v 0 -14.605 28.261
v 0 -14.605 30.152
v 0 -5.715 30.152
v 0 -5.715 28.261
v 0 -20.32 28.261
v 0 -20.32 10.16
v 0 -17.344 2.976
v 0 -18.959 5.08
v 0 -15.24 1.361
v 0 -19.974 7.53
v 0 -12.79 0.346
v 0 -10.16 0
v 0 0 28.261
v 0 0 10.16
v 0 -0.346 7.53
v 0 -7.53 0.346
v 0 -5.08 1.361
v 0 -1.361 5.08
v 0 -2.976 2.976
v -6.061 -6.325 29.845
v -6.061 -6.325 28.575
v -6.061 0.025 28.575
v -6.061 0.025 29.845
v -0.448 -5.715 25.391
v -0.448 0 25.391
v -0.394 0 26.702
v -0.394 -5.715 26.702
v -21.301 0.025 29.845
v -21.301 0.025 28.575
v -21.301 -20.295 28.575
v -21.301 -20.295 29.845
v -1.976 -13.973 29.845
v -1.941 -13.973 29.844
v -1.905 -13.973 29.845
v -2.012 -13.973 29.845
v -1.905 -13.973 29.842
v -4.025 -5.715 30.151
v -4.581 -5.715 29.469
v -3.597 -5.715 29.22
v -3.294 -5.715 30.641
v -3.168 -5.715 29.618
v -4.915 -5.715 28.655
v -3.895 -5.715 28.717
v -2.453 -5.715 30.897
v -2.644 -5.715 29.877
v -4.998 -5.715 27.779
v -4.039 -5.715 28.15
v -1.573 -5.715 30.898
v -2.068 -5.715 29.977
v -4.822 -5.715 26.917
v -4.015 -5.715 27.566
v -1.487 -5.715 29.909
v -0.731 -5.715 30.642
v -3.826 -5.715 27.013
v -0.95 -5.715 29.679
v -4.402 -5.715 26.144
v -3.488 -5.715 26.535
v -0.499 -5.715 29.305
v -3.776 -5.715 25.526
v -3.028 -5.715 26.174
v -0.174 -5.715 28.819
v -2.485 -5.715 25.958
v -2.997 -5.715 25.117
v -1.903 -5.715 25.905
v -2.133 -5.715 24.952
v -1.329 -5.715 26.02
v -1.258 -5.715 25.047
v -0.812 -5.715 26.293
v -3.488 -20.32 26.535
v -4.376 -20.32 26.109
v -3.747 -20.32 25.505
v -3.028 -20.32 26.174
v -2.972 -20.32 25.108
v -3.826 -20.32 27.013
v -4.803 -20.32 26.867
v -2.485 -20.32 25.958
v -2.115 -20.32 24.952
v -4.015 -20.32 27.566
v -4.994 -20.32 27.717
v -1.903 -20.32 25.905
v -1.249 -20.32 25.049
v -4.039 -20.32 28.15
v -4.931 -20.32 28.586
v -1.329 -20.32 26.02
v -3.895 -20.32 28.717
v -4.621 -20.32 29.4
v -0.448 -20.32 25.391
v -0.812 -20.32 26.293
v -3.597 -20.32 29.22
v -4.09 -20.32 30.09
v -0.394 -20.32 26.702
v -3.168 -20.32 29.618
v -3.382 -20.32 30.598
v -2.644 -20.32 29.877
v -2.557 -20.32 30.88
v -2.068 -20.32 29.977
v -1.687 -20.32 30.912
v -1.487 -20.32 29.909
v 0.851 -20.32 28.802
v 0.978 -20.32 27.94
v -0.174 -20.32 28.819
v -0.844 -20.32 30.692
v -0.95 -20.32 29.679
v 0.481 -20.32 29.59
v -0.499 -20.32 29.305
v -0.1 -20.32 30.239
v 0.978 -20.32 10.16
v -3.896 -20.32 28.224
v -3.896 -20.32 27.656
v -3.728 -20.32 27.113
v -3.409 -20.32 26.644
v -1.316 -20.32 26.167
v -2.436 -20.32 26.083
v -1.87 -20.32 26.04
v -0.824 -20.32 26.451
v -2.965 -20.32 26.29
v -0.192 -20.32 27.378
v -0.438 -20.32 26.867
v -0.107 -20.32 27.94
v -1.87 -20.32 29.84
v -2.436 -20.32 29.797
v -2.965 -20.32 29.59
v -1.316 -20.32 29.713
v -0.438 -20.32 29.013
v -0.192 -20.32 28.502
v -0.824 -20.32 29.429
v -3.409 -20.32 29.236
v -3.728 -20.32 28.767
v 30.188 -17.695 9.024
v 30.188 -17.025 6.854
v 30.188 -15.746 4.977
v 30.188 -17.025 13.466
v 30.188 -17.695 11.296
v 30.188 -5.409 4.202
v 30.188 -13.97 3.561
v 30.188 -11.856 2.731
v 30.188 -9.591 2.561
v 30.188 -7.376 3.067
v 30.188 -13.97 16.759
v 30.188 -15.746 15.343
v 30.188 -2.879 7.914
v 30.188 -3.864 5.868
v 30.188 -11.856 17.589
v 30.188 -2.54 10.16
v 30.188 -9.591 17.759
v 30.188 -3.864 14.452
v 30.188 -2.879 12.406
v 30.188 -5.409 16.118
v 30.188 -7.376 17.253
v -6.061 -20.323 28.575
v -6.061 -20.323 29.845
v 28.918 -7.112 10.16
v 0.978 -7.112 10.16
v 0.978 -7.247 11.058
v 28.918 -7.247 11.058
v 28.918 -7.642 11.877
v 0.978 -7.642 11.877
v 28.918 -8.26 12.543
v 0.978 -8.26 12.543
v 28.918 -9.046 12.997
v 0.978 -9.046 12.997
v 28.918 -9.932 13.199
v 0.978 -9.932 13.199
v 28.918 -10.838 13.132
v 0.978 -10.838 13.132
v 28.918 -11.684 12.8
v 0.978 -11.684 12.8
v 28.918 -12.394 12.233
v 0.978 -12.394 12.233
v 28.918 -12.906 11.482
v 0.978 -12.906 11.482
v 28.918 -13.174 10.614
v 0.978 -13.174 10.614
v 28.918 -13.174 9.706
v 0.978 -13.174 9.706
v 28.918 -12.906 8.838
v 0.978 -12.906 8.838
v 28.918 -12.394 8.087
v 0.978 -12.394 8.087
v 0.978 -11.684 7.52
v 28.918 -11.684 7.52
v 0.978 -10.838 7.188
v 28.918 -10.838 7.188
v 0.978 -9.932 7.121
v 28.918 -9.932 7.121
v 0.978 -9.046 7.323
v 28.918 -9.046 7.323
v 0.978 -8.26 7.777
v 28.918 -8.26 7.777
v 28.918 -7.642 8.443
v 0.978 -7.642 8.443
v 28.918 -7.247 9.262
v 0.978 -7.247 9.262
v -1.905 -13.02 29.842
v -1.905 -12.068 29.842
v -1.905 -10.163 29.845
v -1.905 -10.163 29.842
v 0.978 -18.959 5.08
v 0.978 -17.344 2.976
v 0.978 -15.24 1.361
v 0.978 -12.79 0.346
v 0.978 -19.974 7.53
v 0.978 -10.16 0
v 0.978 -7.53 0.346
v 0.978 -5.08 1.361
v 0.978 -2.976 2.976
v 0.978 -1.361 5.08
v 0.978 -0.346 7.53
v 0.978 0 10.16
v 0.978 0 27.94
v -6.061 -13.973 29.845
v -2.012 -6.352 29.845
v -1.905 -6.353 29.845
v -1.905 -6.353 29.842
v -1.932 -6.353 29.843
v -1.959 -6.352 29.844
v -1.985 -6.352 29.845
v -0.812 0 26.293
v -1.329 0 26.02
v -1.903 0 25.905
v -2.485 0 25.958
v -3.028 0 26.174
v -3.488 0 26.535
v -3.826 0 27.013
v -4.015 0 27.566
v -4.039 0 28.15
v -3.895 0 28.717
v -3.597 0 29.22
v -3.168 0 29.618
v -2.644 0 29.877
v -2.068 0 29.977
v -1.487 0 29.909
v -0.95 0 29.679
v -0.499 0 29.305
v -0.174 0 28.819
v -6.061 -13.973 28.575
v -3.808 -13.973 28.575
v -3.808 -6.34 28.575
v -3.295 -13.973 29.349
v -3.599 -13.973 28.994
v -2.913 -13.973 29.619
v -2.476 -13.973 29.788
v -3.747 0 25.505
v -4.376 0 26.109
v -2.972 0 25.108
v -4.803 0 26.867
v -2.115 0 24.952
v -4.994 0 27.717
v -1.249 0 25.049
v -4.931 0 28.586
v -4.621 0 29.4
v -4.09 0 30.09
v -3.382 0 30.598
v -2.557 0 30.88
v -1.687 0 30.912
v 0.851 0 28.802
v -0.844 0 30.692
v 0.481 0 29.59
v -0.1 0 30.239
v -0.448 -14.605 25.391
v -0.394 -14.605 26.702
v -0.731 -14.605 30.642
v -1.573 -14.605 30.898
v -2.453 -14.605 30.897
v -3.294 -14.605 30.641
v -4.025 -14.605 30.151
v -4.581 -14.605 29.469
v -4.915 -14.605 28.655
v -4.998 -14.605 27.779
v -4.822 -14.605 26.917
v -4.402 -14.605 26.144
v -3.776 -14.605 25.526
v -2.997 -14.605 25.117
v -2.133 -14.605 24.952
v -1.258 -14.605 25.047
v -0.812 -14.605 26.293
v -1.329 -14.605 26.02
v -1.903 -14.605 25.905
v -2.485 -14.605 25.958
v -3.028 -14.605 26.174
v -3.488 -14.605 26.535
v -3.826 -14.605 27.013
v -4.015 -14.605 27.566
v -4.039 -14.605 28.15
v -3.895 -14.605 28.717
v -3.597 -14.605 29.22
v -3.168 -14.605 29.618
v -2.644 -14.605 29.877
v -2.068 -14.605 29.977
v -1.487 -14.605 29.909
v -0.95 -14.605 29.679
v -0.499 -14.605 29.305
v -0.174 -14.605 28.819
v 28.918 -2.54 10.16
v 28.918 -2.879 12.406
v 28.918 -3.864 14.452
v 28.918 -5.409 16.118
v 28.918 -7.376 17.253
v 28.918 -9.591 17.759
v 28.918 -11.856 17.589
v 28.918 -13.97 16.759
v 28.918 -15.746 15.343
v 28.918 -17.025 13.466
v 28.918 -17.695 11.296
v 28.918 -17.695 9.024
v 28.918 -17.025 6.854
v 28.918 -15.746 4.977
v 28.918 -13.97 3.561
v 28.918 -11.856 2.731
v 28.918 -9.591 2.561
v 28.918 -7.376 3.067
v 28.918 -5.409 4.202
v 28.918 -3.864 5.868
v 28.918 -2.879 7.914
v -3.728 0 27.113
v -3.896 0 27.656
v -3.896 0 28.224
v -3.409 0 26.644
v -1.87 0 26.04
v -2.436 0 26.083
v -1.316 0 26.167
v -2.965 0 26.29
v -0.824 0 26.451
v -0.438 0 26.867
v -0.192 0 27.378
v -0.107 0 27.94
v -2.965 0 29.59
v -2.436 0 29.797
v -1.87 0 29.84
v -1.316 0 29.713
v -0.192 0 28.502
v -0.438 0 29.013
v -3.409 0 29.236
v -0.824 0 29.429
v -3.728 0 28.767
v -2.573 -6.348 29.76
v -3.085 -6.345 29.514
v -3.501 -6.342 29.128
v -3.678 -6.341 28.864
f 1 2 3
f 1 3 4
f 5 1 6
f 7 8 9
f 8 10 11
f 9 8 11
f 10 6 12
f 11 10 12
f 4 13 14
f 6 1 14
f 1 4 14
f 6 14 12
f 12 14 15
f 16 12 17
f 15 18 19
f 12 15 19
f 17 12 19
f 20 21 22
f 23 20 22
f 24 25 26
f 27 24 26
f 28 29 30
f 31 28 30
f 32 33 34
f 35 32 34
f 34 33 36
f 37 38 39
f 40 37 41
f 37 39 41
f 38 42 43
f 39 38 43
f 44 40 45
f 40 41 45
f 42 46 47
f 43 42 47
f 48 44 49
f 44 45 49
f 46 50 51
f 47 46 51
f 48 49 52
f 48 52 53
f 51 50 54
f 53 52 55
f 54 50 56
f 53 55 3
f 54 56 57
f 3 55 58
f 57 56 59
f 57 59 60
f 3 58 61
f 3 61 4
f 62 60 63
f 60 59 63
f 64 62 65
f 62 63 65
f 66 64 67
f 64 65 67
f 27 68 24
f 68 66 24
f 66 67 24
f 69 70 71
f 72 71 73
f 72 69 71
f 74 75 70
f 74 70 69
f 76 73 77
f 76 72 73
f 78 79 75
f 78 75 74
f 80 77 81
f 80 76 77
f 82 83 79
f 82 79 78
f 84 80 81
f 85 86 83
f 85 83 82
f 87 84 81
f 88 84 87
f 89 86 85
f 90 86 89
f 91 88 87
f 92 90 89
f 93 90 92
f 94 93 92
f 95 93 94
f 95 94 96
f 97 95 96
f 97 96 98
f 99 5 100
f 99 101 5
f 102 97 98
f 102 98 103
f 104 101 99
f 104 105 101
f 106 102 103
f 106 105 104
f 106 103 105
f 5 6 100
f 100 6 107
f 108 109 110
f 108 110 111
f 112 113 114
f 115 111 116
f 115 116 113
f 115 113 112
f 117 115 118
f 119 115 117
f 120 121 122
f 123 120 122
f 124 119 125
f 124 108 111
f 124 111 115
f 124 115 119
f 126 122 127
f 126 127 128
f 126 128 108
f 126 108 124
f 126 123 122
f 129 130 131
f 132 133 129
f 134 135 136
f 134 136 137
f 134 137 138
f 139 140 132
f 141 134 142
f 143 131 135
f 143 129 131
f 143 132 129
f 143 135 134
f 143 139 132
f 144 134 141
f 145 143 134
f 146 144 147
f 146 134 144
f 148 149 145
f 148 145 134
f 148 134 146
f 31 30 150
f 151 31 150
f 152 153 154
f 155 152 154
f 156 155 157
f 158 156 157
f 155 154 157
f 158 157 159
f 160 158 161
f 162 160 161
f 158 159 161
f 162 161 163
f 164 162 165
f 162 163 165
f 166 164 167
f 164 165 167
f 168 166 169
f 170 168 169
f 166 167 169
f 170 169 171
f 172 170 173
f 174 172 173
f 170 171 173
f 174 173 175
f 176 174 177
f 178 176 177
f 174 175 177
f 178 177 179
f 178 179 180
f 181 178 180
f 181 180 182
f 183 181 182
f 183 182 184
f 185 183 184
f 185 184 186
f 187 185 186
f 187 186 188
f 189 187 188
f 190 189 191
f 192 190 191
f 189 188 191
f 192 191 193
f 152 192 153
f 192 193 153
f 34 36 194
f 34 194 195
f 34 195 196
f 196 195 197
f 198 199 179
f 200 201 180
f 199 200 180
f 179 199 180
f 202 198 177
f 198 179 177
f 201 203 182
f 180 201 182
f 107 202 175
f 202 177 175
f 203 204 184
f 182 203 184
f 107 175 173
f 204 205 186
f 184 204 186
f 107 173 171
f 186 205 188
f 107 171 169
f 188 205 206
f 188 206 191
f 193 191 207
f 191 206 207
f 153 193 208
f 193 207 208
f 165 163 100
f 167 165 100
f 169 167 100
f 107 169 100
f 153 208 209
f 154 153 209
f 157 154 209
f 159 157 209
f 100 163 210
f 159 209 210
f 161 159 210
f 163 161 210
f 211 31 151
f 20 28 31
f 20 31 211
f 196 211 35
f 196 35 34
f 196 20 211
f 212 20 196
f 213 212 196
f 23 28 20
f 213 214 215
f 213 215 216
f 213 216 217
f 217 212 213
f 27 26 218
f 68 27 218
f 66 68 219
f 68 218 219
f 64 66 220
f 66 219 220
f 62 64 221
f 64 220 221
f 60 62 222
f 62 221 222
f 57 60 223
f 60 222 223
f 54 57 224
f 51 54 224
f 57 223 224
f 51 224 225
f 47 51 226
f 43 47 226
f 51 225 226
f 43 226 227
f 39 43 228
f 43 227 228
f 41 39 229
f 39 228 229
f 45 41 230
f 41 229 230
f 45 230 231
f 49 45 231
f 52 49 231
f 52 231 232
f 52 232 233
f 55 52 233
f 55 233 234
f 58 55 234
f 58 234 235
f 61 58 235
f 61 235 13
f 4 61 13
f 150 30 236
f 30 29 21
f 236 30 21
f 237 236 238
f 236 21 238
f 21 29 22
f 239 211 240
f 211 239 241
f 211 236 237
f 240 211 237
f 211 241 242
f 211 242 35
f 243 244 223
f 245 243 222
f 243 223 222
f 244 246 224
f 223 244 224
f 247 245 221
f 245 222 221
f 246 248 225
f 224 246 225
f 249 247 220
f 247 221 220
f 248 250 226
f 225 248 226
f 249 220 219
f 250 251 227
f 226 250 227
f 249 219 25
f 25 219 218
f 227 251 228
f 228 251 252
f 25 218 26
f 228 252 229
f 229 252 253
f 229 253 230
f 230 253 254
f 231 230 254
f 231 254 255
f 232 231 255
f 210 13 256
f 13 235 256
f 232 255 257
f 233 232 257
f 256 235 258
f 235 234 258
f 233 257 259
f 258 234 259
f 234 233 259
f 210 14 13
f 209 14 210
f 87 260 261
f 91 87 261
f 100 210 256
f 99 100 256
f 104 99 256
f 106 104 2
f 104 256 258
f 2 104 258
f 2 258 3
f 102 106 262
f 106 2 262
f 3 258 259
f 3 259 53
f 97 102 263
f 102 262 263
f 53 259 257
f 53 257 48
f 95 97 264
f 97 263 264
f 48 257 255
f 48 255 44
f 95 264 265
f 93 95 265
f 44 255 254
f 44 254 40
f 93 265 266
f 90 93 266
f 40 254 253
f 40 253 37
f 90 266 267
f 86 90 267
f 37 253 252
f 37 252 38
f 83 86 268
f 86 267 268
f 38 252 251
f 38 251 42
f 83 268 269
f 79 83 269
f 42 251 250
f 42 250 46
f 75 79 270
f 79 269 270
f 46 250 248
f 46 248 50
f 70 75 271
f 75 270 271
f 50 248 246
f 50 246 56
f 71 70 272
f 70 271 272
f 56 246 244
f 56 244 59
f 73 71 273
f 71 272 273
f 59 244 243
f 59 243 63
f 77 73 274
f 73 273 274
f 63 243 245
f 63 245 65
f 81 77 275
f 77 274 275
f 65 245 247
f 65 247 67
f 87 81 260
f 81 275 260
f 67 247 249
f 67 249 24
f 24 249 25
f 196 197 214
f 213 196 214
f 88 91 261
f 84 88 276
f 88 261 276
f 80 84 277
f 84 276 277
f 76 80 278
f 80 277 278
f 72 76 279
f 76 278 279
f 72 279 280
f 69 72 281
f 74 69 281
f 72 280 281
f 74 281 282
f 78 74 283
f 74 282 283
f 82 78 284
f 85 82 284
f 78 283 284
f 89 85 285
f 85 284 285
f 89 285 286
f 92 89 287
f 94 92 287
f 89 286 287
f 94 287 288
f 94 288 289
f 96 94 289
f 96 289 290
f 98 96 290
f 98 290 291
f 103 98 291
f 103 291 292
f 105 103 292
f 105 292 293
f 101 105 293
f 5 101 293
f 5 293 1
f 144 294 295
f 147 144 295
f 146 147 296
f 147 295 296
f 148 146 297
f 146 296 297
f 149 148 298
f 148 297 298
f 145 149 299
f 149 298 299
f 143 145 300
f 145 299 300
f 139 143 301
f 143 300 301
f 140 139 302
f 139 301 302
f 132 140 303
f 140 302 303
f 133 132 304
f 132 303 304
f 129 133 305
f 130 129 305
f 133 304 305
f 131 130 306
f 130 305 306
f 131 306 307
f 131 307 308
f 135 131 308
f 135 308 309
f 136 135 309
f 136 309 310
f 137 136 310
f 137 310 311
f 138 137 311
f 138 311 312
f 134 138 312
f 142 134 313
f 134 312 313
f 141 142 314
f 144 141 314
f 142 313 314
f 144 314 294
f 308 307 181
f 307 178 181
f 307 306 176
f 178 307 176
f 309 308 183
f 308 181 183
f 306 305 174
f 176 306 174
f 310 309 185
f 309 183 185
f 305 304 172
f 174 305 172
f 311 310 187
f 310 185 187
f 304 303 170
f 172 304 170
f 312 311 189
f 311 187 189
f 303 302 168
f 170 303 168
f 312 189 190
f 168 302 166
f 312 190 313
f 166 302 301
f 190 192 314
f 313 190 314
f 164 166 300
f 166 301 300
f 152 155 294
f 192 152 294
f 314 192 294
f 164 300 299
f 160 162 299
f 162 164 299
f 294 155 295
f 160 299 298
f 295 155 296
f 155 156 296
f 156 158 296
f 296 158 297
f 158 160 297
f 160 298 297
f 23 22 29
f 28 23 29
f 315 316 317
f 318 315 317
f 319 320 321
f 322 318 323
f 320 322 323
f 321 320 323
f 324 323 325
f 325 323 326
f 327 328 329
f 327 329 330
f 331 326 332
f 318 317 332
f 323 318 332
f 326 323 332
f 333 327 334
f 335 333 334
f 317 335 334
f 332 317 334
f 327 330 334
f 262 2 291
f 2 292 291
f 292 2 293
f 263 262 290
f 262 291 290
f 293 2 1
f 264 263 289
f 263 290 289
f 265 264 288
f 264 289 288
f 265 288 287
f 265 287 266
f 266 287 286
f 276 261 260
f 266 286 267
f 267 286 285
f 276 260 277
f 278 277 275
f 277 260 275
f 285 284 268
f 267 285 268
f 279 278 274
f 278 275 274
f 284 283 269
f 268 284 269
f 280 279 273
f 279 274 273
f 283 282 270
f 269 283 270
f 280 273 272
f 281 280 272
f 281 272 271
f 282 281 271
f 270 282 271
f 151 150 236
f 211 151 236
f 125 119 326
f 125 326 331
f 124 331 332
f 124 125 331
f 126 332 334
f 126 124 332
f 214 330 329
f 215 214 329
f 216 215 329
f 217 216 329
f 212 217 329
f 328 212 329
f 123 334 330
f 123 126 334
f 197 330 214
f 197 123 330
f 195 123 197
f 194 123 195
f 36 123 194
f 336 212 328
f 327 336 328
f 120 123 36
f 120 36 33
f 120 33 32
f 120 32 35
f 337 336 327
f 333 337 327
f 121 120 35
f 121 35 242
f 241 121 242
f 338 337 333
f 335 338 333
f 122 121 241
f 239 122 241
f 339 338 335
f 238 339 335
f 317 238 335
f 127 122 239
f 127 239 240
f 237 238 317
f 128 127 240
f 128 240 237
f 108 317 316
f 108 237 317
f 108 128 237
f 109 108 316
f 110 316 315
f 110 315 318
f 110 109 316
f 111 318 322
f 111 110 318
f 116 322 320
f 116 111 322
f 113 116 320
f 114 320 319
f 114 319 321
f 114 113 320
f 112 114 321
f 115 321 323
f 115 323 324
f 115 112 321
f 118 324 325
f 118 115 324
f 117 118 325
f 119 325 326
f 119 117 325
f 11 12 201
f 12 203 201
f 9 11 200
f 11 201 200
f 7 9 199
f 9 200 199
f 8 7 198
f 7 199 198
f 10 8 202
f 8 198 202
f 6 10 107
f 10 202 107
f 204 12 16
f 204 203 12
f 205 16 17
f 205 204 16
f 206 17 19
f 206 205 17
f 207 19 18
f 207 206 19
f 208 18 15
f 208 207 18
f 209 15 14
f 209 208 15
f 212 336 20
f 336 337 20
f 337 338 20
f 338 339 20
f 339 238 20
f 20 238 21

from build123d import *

# Parameters (mm, degrees)
F1_DEPTH  = 20.32
F2_W      = 6.6402247176
F2_H      = 4.445
F3_DEPTH  = 50.8
F4_R      = 1.905
F5_DEPTH  = 20.32
F8_DEPTH  = 1.27
F9_R      = 10.15999
F10_R     = 3.048
F11_DEPTH = 27.94
F12_R     = 7.62
F13_DEPTH = 1.27


# Not quite as in the source:
# - a fillet or chamfer is up to 0.001 mm smaller than in the source, because OpenCascade refuses the exact size


with BuildPart() as f1:
    # F0 (on Front) → F1 (new body)
    with BuildSketch(Plane.XZ):
        with BuildLine():
            Line((0, 28.2609894363), (0, 0))
            Line((0, 0), (0.9779490576, 0))
            Line((0.9779490576, 0), (0.9779490576, 27.94))
            ThreePointArc((0.9779490576, 27.94), (-4.6212260032, 29.4002809847), (-0.4484143049, 25.3914377043))
            Line((-0.4484143049, 25.3914377043), (-0.3938082239, 26.7019847298))
            ThreePointArc((-0.3938082239, 26.7019847298), (-3.9875154003, 28.439004333), (0, 28.2609894363))
        make_face()
    extrude(amount=F1_DEPTH)

    # F2 (on face) → F3 (cut)
    with BuildSketch(Plane(origin=(0, 0, 0), x_dir=(1, 0, 0), z_dir=(0, 0, -1))):
        with Locations((-3.3201123588, 7.9375)):
            Rectangle(F2_W, F2_H)
        with Locations((-3.3201123588, 12.3825)):
            Rectangle(F2_W, F2_H)
        Polygon((-6.6402247176, 5.715), (-6.6402247176, 10.16), (-6.6402247176, 14.605), (-8.3473562263, 14.605), (-8.3473562263, 5.715), align=None)
    extrude(amount=-F3_DEPTH, mode=Mode.SUBTRACT)

    # F9 (radius 10.16 in the source; OpenCascade refuses exactly that, so slightly less here)
    f9_edges = [f1.edges().sort_by_distance(p)[0] for p in [
        (0.488975, 0, 0),
        (0.488975, -20.32, 0),
    ]]
    fillet(f9_edges, radius=F9_R)

    # F10 (on face) → F11 (join)
    with BuildSketch(Plane.YZ.offset(0.9779490576)):
        with Locations((-10.16, 10.16)):
            Circle(F10_R)
    extrude(amount=F11_DEPTH)

    # F12 (on face) → F13 (join)
    with BuildSketch(Plane.YZ.offset(28.9179490576)):
        with Locations((-10.16, 10.16)):
            Circle(F12_R)
    extrude(amount=F13_DEPTH)


with BuildPart() as f5:
    # F4 (on face) → F5 (new body)
    with BuildSketch(Plane.XZ.offset(20.32)):
        with Locations((-2.0120612164, 27.94)):
            Circle(F4_R)
    extrude(amount=-F5_DEPTH)

    # F7 (on offset) → F8 (join)
    with BuildSketch(Plane.XY.offset(28.575)):
        Polygon((-6.0613232421, -6.325361908), (-6.0613478435, -13.9727453345), (-1.9049090762, -13.9727453345), (-1.9049980218, -10.1627453355), (-1.9049980218, -6.3527453355), align=None)
        Polygon((-6.0613478435, -20.3227453345), (-6.0613478435, -13.9727453345), (-6.0613232421, -6.325361908), (-6.0613232421, 0.024638092), (-21.3013232421, 0.024638092), (-21.3013232421, -20.295361908), align=None)
    extrude(amount=F8_DEPTH)


solid = Compound([f1.part, f5.part])
